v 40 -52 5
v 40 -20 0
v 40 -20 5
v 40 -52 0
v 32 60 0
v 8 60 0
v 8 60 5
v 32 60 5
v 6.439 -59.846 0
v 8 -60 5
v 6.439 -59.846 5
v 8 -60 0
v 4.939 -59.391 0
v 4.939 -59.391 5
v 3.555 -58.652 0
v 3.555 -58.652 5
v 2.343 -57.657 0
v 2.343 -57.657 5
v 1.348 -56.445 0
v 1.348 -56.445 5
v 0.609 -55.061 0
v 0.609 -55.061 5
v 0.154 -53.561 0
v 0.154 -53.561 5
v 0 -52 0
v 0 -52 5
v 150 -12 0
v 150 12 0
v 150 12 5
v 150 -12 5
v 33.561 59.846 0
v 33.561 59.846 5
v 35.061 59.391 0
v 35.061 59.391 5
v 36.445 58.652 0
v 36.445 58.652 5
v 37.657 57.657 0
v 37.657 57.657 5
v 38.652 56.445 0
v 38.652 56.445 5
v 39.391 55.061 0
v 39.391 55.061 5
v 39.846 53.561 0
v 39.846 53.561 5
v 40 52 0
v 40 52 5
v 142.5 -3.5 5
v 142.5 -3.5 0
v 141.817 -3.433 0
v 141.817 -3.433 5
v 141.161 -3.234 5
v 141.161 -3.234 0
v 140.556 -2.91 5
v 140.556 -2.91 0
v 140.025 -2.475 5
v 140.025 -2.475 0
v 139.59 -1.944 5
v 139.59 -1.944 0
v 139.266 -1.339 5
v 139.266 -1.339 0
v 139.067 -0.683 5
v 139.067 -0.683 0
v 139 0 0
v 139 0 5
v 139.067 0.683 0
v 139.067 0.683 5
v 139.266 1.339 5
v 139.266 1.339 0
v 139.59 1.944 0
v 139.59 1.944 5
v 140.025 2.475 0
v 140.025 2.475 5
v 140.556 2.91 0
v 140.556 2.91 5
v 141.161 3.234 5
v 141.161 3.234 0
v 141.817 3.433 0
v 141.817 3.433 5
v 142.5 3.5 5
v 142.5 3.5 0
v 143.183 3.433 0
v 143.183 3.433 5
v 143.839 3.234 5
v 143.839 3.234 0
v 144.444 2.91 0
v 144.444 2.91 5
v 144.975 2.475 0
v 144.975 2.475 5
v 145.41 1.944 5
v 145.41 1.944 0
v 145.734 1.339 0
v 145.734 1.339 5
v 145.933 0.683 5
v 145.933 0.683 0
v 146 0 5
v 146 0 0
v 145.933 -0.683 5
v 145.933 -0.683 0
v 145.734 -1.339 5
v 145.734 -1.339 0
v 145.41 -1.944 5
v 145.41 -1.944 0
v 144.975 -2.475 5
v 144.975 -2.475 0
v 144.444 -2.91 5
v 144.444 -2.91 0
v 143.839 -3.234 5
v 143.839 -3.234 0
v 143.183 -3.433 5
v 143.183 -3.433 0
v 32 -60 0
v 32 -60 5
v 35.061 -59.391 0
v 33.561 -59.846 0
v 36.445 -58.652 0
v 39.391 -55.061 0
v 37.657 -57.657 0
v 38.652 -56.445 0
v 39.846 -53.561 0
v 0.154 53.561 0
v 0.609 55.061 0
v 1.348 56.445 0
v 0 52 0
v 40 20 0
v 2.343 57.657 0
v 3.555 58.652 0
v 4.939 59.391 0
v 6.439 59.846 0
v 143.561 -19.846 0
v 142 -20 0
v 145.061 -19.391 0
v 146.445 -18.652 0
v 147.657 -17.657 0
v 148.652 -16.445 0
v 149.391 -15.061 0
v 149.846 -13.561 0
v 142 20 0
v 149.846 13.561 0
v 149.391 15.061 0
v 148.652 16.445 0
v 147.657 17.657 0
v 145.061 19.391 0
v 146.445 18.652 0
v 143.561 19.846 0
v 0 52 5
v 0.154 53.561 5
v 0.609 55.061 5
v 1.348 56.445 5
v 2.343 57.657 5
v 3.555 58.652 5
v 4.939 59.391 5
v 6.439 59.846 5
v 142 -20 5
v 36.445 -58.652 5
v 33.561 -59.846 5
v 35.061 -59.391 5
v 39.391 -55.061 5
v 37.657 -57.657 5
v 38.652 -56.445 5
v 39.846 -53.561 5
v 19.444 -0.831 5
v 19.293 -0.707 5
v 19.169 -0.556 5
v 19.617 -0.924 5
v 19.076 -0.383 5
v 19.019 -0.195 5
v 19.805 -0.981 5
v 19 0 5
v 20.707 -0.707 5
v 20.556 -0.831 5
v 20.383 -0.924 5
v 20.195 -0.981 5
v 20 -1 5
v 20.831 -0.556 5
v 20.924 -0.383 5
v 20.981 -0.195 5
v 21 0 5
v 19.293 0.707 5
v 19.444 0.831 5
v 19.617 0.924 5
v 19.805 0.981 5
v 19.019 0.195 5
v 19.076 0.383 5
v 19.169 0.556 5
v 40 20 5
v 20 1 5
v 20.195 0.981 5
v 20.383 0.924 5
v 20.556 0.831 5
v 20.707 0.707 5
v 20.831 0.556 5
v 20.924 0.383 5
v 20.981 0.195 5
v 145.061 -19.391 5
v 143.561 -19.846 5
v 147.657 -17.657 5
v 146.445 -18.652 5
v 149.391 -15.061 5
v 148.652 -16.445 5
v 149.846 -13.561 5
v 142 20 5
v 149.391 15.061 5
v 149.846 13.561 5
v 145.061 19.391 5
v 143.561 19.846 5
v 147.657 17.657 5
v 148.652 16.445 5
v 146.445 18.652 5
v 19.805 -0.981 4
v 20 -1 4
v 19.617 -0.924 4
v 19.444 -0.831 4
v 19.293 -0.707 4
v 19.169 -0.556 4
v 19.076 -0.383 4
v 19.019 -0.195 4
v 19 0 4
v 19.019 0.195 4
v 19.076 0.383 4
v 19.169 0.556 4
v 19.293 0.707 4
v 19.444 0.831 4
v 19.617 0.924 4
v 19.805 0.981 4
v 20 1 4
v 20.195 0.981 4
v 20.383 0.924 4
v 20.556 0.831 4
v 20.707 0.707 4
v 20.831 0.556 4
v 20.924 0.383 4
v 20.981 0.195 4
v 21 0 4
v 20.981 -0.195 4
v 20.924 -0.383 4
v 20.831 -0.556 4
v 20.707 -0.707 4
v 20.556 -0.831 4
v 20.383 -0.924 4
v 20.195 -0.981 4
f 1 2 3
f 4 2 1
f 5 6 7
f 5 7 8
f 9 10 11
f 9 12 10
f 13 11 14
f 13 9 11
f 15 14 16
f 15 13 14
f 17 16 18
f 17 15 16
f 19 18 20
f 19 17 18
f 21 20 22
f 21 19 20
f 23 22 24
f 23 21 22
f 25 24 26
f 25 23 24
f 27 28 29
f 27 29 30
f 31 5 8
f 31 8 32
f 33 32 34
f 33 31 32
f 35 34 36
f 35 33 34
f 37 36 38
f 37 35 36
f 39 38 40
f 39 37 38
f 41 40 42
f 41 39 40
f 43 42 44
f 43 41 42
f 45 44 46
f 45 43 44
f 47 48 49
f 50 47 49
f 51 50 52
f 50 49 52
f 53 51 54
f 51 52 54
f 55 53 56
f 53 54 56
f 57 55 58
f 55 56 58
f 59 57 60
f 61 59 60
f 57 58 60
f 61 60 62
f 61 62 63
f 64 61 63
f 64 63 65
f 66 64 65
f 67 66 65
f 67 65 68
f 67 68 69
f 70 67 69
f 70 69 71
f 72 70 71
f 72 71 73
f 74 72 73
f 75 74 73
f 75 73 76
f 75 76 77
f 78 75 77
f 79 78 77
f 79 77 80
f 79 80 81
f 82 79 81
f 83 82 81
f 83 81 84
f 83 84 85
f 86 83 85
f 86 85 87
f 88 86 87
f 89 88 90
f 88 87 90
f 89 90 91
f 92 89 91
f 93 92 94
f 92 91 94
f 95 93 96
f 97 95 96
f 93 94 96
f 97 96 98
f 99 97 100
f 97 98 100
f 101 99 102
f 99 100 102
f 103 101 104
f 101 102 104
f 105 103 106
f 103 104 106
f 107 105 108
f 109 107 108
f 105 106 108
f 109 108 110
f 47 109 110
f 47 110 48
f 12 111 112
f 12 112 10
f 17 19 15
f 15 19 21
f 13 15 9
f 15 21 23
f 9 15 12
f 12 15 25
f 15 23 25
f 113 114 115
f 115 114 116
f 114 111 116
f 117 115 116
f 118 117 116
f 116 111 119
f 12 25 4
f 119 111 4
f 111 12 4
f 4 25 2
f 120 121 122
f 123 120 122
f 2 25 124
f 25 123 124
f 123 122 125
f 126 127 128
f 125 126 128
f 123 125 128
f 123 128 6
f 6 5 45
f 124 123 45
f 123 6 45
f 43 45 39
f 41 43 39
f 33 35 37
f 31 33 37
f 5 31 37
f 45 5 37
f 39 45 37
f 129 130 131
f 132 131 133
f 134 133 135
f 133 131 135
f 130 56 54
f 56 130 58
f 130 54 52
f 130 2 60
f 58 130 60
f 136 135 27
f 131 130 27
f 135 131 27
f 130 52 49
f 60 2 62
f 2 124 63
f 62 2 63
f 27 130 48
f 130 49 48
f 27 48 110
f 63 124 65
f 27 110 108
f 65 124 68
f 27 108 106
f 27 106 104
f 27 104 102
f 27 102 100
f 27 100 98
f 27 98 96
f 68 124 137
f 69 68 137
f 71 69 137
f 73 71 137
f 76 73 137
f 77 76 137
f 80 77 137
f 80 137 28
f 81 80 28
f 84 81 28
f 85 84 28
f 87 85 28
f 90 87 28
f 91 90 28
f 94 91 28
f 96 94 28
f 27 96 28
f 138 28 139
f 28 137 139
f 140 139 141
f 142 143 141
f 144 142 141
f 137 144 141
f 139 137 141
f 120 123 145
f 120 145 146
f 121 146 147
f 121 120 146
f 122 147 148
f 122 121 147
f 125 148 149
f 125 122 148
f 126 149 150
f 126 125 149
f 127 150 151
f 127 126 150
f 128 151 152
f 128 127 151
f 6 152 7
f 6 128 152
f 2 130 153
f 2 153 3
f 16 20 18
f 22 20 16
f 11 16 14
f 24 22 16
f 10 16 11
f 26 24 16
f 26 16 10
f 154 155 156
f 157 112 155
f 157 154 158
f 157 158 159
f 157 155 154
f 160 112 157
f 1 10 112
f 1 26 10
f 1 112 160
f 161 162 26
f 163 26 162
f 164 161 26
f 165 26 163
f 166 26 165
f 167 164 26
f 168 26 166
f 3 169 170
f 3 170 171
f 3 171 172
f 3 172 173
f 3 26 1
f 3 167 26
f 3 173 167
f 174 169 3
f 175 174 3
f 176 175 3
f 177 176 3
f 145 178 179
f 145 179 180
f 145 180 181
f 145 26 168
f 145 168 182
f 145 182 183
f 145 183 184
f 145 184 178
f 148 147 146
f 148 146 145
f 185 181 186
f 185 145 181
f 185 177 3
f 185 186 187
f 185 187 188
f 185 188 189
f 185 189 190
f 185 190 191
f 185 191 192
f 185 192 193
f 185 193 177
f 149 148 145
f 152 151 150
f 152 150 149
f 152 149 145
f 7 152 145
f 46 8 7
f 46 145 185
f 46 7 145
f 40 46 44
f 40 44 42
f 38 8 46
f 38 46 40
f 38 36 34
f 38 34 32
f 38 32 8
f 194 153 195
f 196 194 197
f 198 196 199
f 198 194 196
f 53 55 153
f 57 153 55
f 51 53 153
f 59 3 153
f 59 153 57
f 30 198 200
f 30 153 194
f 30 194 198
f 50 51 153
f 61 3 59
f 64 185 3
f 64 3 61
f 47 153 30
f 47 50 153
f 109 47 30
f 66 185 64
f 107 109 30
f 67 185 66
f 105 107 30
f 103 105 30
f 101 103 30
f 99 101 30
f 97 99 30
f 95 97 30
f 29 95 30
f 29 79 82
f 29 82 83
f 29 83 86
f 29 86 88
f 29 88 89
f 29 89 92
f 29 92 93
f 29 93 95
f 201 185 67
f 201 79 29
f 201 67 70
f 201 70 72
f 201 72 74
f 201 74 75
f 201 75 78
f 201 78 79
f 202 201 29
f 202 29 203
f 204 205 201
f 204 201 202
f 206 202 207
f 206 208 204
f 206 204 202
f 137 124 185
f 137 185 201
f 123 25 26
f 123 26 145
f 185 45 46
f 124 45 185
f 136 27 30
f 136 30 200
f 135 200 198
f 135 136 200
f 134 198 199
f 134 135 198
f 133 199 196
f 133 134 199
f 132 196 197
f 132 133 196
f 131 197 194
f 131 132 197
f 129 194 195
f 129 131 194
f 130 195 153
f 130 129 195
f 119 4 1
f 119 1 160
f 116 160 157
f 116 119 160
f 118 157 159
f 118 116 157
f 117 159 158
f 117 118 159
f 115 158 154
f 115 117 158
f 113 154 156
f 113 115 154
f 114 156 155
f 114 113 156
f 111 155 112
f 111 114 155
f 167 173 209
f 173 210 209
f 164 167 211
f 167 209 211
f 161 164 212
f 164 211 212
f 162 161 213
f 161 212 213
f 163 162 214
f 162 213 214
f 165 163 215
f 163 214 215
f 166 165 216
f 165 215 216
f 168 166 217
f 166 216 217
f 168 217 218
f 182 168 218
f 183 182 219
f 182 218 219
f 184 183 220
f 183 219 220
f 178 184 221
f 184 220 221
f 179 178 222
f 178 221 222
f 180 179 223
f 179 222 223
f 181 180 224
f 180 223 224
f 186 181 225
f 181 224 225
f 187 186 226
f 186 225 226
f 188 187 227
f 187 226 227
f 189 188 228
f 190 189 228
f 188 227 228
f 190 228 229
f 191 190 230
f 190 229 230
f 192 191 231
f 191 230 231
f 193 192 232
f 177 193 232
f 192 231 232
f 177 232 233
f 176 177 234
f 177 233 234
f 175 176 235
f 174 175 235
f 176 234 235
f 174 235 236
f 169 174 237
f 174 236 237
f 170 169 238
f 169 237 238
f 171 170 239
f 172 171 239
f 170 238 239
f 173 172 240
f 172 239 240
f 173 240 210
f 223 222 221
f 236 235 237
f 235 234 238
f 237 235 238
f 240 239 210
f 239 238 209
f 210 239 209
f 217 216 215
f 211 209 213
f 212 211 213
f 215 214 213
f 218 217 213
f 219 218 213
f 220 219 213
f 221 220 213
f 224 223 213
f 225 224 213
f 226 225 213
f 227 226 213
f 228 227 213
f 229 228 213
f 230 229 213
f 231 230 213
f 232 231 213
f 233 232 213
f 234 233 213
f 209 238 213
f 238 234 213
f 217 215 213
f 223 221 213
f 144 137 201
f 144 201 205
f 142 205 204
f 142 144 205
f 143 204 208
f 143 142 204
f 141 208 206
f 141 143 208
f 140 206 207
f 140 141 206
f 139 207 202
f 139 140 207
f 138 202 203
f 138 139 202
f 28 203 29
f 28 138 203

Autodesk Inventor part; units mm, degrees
ref_plane "YZ Plane" through (0, 0, 0) normal (1, 0, 0) x (0, 1, 0)
ref_plane "XZ Plane" through (0, 0, 0) normal (0, 1, 0) x (-1, 0, 0)
ref_plane "XY Plane" through (0, 0, 0) normal (0, 0, 1) x (1, 0, 0)
sketch "Sketch1" plane through (0, 0, 0) normal (0, 0, 1) x (1, 0, 0)
  line L0 (8, 60) -> (32, 60)
  line L1 (32, -60) -> (8, -60)
  line L2 (0, -52) -> (0, 52)
  line L3 (40, 20) -> (142, 20)
  line L4 (150, 12) -> (150, -12)
  line L5 (142, -20) -> (40, -20)
  line L6 (40, 52) -> (40, 20)
  line L7 (40, -20) -> (40, -52)
  line L8 (0, 0) -> (150, 0) construction
  arc A0 (8, 60) -> (0, 52) centre (8, 52) ccw
  arc A1 (0, -52) -> (8, -60) centre (8, -52) ccw
  arc A2 (40, 52) -> (32, 60) centre (32, 52) ccw
  arc A3 (142, -20) -> (150, -12) centre (142, -12) ccw
  arc A4 (150, 12) -> (142, 20) centre (142, 12) ccw
  arc A5 (32, -60) -> (40, -52) centre (32, -52) ccw
  point P0 (0, 0)
  point P1 (40, -60)
  point P2 (0, -60)
  point P3 (150, -20)
  point P4 (150, 20)
  dimension "d0" = 40
  dimension "d1" = 40
  dimension "d2" = 150
  dimension "d3" = 8
  dimension "d4" = 8
  dimension "d5" = 120
extrude "Extrusion1" add sketch "Sketch1" along normal blind 5
sketch "Sketch2" plane through (0, 0, 5) normal (0, 0, 1) x (1, 0, 0)
  line L0 (150, -12) -> (150, 12) projected
  line L1 (40, -20) -> (142, -20) projected
  point P0 (0, 0)
  point P1 (142.5, 0)
  dimension "d8" = 7.5
  dimension "d9" = 20
hole "Hole1" at (142.5, 0, 5) direction (0, 0, -1) diameter 7 end through all
sketch "Sketch3" plane through (0, 0, 5) normal (0, 0, 1) x (1, 0, 0)
  line L0 (0, 52) -> (0, -52) projected
  point P0 (0, 0)
  point P1 (20, 0)
  dimension "d17" = 20
hole "Hole2" at (20, 0, 5) direction (0, 0, -1) diameter 2 depth 1
properties part number "PistonBC" material "MDF Medium Density Fiberboard"
